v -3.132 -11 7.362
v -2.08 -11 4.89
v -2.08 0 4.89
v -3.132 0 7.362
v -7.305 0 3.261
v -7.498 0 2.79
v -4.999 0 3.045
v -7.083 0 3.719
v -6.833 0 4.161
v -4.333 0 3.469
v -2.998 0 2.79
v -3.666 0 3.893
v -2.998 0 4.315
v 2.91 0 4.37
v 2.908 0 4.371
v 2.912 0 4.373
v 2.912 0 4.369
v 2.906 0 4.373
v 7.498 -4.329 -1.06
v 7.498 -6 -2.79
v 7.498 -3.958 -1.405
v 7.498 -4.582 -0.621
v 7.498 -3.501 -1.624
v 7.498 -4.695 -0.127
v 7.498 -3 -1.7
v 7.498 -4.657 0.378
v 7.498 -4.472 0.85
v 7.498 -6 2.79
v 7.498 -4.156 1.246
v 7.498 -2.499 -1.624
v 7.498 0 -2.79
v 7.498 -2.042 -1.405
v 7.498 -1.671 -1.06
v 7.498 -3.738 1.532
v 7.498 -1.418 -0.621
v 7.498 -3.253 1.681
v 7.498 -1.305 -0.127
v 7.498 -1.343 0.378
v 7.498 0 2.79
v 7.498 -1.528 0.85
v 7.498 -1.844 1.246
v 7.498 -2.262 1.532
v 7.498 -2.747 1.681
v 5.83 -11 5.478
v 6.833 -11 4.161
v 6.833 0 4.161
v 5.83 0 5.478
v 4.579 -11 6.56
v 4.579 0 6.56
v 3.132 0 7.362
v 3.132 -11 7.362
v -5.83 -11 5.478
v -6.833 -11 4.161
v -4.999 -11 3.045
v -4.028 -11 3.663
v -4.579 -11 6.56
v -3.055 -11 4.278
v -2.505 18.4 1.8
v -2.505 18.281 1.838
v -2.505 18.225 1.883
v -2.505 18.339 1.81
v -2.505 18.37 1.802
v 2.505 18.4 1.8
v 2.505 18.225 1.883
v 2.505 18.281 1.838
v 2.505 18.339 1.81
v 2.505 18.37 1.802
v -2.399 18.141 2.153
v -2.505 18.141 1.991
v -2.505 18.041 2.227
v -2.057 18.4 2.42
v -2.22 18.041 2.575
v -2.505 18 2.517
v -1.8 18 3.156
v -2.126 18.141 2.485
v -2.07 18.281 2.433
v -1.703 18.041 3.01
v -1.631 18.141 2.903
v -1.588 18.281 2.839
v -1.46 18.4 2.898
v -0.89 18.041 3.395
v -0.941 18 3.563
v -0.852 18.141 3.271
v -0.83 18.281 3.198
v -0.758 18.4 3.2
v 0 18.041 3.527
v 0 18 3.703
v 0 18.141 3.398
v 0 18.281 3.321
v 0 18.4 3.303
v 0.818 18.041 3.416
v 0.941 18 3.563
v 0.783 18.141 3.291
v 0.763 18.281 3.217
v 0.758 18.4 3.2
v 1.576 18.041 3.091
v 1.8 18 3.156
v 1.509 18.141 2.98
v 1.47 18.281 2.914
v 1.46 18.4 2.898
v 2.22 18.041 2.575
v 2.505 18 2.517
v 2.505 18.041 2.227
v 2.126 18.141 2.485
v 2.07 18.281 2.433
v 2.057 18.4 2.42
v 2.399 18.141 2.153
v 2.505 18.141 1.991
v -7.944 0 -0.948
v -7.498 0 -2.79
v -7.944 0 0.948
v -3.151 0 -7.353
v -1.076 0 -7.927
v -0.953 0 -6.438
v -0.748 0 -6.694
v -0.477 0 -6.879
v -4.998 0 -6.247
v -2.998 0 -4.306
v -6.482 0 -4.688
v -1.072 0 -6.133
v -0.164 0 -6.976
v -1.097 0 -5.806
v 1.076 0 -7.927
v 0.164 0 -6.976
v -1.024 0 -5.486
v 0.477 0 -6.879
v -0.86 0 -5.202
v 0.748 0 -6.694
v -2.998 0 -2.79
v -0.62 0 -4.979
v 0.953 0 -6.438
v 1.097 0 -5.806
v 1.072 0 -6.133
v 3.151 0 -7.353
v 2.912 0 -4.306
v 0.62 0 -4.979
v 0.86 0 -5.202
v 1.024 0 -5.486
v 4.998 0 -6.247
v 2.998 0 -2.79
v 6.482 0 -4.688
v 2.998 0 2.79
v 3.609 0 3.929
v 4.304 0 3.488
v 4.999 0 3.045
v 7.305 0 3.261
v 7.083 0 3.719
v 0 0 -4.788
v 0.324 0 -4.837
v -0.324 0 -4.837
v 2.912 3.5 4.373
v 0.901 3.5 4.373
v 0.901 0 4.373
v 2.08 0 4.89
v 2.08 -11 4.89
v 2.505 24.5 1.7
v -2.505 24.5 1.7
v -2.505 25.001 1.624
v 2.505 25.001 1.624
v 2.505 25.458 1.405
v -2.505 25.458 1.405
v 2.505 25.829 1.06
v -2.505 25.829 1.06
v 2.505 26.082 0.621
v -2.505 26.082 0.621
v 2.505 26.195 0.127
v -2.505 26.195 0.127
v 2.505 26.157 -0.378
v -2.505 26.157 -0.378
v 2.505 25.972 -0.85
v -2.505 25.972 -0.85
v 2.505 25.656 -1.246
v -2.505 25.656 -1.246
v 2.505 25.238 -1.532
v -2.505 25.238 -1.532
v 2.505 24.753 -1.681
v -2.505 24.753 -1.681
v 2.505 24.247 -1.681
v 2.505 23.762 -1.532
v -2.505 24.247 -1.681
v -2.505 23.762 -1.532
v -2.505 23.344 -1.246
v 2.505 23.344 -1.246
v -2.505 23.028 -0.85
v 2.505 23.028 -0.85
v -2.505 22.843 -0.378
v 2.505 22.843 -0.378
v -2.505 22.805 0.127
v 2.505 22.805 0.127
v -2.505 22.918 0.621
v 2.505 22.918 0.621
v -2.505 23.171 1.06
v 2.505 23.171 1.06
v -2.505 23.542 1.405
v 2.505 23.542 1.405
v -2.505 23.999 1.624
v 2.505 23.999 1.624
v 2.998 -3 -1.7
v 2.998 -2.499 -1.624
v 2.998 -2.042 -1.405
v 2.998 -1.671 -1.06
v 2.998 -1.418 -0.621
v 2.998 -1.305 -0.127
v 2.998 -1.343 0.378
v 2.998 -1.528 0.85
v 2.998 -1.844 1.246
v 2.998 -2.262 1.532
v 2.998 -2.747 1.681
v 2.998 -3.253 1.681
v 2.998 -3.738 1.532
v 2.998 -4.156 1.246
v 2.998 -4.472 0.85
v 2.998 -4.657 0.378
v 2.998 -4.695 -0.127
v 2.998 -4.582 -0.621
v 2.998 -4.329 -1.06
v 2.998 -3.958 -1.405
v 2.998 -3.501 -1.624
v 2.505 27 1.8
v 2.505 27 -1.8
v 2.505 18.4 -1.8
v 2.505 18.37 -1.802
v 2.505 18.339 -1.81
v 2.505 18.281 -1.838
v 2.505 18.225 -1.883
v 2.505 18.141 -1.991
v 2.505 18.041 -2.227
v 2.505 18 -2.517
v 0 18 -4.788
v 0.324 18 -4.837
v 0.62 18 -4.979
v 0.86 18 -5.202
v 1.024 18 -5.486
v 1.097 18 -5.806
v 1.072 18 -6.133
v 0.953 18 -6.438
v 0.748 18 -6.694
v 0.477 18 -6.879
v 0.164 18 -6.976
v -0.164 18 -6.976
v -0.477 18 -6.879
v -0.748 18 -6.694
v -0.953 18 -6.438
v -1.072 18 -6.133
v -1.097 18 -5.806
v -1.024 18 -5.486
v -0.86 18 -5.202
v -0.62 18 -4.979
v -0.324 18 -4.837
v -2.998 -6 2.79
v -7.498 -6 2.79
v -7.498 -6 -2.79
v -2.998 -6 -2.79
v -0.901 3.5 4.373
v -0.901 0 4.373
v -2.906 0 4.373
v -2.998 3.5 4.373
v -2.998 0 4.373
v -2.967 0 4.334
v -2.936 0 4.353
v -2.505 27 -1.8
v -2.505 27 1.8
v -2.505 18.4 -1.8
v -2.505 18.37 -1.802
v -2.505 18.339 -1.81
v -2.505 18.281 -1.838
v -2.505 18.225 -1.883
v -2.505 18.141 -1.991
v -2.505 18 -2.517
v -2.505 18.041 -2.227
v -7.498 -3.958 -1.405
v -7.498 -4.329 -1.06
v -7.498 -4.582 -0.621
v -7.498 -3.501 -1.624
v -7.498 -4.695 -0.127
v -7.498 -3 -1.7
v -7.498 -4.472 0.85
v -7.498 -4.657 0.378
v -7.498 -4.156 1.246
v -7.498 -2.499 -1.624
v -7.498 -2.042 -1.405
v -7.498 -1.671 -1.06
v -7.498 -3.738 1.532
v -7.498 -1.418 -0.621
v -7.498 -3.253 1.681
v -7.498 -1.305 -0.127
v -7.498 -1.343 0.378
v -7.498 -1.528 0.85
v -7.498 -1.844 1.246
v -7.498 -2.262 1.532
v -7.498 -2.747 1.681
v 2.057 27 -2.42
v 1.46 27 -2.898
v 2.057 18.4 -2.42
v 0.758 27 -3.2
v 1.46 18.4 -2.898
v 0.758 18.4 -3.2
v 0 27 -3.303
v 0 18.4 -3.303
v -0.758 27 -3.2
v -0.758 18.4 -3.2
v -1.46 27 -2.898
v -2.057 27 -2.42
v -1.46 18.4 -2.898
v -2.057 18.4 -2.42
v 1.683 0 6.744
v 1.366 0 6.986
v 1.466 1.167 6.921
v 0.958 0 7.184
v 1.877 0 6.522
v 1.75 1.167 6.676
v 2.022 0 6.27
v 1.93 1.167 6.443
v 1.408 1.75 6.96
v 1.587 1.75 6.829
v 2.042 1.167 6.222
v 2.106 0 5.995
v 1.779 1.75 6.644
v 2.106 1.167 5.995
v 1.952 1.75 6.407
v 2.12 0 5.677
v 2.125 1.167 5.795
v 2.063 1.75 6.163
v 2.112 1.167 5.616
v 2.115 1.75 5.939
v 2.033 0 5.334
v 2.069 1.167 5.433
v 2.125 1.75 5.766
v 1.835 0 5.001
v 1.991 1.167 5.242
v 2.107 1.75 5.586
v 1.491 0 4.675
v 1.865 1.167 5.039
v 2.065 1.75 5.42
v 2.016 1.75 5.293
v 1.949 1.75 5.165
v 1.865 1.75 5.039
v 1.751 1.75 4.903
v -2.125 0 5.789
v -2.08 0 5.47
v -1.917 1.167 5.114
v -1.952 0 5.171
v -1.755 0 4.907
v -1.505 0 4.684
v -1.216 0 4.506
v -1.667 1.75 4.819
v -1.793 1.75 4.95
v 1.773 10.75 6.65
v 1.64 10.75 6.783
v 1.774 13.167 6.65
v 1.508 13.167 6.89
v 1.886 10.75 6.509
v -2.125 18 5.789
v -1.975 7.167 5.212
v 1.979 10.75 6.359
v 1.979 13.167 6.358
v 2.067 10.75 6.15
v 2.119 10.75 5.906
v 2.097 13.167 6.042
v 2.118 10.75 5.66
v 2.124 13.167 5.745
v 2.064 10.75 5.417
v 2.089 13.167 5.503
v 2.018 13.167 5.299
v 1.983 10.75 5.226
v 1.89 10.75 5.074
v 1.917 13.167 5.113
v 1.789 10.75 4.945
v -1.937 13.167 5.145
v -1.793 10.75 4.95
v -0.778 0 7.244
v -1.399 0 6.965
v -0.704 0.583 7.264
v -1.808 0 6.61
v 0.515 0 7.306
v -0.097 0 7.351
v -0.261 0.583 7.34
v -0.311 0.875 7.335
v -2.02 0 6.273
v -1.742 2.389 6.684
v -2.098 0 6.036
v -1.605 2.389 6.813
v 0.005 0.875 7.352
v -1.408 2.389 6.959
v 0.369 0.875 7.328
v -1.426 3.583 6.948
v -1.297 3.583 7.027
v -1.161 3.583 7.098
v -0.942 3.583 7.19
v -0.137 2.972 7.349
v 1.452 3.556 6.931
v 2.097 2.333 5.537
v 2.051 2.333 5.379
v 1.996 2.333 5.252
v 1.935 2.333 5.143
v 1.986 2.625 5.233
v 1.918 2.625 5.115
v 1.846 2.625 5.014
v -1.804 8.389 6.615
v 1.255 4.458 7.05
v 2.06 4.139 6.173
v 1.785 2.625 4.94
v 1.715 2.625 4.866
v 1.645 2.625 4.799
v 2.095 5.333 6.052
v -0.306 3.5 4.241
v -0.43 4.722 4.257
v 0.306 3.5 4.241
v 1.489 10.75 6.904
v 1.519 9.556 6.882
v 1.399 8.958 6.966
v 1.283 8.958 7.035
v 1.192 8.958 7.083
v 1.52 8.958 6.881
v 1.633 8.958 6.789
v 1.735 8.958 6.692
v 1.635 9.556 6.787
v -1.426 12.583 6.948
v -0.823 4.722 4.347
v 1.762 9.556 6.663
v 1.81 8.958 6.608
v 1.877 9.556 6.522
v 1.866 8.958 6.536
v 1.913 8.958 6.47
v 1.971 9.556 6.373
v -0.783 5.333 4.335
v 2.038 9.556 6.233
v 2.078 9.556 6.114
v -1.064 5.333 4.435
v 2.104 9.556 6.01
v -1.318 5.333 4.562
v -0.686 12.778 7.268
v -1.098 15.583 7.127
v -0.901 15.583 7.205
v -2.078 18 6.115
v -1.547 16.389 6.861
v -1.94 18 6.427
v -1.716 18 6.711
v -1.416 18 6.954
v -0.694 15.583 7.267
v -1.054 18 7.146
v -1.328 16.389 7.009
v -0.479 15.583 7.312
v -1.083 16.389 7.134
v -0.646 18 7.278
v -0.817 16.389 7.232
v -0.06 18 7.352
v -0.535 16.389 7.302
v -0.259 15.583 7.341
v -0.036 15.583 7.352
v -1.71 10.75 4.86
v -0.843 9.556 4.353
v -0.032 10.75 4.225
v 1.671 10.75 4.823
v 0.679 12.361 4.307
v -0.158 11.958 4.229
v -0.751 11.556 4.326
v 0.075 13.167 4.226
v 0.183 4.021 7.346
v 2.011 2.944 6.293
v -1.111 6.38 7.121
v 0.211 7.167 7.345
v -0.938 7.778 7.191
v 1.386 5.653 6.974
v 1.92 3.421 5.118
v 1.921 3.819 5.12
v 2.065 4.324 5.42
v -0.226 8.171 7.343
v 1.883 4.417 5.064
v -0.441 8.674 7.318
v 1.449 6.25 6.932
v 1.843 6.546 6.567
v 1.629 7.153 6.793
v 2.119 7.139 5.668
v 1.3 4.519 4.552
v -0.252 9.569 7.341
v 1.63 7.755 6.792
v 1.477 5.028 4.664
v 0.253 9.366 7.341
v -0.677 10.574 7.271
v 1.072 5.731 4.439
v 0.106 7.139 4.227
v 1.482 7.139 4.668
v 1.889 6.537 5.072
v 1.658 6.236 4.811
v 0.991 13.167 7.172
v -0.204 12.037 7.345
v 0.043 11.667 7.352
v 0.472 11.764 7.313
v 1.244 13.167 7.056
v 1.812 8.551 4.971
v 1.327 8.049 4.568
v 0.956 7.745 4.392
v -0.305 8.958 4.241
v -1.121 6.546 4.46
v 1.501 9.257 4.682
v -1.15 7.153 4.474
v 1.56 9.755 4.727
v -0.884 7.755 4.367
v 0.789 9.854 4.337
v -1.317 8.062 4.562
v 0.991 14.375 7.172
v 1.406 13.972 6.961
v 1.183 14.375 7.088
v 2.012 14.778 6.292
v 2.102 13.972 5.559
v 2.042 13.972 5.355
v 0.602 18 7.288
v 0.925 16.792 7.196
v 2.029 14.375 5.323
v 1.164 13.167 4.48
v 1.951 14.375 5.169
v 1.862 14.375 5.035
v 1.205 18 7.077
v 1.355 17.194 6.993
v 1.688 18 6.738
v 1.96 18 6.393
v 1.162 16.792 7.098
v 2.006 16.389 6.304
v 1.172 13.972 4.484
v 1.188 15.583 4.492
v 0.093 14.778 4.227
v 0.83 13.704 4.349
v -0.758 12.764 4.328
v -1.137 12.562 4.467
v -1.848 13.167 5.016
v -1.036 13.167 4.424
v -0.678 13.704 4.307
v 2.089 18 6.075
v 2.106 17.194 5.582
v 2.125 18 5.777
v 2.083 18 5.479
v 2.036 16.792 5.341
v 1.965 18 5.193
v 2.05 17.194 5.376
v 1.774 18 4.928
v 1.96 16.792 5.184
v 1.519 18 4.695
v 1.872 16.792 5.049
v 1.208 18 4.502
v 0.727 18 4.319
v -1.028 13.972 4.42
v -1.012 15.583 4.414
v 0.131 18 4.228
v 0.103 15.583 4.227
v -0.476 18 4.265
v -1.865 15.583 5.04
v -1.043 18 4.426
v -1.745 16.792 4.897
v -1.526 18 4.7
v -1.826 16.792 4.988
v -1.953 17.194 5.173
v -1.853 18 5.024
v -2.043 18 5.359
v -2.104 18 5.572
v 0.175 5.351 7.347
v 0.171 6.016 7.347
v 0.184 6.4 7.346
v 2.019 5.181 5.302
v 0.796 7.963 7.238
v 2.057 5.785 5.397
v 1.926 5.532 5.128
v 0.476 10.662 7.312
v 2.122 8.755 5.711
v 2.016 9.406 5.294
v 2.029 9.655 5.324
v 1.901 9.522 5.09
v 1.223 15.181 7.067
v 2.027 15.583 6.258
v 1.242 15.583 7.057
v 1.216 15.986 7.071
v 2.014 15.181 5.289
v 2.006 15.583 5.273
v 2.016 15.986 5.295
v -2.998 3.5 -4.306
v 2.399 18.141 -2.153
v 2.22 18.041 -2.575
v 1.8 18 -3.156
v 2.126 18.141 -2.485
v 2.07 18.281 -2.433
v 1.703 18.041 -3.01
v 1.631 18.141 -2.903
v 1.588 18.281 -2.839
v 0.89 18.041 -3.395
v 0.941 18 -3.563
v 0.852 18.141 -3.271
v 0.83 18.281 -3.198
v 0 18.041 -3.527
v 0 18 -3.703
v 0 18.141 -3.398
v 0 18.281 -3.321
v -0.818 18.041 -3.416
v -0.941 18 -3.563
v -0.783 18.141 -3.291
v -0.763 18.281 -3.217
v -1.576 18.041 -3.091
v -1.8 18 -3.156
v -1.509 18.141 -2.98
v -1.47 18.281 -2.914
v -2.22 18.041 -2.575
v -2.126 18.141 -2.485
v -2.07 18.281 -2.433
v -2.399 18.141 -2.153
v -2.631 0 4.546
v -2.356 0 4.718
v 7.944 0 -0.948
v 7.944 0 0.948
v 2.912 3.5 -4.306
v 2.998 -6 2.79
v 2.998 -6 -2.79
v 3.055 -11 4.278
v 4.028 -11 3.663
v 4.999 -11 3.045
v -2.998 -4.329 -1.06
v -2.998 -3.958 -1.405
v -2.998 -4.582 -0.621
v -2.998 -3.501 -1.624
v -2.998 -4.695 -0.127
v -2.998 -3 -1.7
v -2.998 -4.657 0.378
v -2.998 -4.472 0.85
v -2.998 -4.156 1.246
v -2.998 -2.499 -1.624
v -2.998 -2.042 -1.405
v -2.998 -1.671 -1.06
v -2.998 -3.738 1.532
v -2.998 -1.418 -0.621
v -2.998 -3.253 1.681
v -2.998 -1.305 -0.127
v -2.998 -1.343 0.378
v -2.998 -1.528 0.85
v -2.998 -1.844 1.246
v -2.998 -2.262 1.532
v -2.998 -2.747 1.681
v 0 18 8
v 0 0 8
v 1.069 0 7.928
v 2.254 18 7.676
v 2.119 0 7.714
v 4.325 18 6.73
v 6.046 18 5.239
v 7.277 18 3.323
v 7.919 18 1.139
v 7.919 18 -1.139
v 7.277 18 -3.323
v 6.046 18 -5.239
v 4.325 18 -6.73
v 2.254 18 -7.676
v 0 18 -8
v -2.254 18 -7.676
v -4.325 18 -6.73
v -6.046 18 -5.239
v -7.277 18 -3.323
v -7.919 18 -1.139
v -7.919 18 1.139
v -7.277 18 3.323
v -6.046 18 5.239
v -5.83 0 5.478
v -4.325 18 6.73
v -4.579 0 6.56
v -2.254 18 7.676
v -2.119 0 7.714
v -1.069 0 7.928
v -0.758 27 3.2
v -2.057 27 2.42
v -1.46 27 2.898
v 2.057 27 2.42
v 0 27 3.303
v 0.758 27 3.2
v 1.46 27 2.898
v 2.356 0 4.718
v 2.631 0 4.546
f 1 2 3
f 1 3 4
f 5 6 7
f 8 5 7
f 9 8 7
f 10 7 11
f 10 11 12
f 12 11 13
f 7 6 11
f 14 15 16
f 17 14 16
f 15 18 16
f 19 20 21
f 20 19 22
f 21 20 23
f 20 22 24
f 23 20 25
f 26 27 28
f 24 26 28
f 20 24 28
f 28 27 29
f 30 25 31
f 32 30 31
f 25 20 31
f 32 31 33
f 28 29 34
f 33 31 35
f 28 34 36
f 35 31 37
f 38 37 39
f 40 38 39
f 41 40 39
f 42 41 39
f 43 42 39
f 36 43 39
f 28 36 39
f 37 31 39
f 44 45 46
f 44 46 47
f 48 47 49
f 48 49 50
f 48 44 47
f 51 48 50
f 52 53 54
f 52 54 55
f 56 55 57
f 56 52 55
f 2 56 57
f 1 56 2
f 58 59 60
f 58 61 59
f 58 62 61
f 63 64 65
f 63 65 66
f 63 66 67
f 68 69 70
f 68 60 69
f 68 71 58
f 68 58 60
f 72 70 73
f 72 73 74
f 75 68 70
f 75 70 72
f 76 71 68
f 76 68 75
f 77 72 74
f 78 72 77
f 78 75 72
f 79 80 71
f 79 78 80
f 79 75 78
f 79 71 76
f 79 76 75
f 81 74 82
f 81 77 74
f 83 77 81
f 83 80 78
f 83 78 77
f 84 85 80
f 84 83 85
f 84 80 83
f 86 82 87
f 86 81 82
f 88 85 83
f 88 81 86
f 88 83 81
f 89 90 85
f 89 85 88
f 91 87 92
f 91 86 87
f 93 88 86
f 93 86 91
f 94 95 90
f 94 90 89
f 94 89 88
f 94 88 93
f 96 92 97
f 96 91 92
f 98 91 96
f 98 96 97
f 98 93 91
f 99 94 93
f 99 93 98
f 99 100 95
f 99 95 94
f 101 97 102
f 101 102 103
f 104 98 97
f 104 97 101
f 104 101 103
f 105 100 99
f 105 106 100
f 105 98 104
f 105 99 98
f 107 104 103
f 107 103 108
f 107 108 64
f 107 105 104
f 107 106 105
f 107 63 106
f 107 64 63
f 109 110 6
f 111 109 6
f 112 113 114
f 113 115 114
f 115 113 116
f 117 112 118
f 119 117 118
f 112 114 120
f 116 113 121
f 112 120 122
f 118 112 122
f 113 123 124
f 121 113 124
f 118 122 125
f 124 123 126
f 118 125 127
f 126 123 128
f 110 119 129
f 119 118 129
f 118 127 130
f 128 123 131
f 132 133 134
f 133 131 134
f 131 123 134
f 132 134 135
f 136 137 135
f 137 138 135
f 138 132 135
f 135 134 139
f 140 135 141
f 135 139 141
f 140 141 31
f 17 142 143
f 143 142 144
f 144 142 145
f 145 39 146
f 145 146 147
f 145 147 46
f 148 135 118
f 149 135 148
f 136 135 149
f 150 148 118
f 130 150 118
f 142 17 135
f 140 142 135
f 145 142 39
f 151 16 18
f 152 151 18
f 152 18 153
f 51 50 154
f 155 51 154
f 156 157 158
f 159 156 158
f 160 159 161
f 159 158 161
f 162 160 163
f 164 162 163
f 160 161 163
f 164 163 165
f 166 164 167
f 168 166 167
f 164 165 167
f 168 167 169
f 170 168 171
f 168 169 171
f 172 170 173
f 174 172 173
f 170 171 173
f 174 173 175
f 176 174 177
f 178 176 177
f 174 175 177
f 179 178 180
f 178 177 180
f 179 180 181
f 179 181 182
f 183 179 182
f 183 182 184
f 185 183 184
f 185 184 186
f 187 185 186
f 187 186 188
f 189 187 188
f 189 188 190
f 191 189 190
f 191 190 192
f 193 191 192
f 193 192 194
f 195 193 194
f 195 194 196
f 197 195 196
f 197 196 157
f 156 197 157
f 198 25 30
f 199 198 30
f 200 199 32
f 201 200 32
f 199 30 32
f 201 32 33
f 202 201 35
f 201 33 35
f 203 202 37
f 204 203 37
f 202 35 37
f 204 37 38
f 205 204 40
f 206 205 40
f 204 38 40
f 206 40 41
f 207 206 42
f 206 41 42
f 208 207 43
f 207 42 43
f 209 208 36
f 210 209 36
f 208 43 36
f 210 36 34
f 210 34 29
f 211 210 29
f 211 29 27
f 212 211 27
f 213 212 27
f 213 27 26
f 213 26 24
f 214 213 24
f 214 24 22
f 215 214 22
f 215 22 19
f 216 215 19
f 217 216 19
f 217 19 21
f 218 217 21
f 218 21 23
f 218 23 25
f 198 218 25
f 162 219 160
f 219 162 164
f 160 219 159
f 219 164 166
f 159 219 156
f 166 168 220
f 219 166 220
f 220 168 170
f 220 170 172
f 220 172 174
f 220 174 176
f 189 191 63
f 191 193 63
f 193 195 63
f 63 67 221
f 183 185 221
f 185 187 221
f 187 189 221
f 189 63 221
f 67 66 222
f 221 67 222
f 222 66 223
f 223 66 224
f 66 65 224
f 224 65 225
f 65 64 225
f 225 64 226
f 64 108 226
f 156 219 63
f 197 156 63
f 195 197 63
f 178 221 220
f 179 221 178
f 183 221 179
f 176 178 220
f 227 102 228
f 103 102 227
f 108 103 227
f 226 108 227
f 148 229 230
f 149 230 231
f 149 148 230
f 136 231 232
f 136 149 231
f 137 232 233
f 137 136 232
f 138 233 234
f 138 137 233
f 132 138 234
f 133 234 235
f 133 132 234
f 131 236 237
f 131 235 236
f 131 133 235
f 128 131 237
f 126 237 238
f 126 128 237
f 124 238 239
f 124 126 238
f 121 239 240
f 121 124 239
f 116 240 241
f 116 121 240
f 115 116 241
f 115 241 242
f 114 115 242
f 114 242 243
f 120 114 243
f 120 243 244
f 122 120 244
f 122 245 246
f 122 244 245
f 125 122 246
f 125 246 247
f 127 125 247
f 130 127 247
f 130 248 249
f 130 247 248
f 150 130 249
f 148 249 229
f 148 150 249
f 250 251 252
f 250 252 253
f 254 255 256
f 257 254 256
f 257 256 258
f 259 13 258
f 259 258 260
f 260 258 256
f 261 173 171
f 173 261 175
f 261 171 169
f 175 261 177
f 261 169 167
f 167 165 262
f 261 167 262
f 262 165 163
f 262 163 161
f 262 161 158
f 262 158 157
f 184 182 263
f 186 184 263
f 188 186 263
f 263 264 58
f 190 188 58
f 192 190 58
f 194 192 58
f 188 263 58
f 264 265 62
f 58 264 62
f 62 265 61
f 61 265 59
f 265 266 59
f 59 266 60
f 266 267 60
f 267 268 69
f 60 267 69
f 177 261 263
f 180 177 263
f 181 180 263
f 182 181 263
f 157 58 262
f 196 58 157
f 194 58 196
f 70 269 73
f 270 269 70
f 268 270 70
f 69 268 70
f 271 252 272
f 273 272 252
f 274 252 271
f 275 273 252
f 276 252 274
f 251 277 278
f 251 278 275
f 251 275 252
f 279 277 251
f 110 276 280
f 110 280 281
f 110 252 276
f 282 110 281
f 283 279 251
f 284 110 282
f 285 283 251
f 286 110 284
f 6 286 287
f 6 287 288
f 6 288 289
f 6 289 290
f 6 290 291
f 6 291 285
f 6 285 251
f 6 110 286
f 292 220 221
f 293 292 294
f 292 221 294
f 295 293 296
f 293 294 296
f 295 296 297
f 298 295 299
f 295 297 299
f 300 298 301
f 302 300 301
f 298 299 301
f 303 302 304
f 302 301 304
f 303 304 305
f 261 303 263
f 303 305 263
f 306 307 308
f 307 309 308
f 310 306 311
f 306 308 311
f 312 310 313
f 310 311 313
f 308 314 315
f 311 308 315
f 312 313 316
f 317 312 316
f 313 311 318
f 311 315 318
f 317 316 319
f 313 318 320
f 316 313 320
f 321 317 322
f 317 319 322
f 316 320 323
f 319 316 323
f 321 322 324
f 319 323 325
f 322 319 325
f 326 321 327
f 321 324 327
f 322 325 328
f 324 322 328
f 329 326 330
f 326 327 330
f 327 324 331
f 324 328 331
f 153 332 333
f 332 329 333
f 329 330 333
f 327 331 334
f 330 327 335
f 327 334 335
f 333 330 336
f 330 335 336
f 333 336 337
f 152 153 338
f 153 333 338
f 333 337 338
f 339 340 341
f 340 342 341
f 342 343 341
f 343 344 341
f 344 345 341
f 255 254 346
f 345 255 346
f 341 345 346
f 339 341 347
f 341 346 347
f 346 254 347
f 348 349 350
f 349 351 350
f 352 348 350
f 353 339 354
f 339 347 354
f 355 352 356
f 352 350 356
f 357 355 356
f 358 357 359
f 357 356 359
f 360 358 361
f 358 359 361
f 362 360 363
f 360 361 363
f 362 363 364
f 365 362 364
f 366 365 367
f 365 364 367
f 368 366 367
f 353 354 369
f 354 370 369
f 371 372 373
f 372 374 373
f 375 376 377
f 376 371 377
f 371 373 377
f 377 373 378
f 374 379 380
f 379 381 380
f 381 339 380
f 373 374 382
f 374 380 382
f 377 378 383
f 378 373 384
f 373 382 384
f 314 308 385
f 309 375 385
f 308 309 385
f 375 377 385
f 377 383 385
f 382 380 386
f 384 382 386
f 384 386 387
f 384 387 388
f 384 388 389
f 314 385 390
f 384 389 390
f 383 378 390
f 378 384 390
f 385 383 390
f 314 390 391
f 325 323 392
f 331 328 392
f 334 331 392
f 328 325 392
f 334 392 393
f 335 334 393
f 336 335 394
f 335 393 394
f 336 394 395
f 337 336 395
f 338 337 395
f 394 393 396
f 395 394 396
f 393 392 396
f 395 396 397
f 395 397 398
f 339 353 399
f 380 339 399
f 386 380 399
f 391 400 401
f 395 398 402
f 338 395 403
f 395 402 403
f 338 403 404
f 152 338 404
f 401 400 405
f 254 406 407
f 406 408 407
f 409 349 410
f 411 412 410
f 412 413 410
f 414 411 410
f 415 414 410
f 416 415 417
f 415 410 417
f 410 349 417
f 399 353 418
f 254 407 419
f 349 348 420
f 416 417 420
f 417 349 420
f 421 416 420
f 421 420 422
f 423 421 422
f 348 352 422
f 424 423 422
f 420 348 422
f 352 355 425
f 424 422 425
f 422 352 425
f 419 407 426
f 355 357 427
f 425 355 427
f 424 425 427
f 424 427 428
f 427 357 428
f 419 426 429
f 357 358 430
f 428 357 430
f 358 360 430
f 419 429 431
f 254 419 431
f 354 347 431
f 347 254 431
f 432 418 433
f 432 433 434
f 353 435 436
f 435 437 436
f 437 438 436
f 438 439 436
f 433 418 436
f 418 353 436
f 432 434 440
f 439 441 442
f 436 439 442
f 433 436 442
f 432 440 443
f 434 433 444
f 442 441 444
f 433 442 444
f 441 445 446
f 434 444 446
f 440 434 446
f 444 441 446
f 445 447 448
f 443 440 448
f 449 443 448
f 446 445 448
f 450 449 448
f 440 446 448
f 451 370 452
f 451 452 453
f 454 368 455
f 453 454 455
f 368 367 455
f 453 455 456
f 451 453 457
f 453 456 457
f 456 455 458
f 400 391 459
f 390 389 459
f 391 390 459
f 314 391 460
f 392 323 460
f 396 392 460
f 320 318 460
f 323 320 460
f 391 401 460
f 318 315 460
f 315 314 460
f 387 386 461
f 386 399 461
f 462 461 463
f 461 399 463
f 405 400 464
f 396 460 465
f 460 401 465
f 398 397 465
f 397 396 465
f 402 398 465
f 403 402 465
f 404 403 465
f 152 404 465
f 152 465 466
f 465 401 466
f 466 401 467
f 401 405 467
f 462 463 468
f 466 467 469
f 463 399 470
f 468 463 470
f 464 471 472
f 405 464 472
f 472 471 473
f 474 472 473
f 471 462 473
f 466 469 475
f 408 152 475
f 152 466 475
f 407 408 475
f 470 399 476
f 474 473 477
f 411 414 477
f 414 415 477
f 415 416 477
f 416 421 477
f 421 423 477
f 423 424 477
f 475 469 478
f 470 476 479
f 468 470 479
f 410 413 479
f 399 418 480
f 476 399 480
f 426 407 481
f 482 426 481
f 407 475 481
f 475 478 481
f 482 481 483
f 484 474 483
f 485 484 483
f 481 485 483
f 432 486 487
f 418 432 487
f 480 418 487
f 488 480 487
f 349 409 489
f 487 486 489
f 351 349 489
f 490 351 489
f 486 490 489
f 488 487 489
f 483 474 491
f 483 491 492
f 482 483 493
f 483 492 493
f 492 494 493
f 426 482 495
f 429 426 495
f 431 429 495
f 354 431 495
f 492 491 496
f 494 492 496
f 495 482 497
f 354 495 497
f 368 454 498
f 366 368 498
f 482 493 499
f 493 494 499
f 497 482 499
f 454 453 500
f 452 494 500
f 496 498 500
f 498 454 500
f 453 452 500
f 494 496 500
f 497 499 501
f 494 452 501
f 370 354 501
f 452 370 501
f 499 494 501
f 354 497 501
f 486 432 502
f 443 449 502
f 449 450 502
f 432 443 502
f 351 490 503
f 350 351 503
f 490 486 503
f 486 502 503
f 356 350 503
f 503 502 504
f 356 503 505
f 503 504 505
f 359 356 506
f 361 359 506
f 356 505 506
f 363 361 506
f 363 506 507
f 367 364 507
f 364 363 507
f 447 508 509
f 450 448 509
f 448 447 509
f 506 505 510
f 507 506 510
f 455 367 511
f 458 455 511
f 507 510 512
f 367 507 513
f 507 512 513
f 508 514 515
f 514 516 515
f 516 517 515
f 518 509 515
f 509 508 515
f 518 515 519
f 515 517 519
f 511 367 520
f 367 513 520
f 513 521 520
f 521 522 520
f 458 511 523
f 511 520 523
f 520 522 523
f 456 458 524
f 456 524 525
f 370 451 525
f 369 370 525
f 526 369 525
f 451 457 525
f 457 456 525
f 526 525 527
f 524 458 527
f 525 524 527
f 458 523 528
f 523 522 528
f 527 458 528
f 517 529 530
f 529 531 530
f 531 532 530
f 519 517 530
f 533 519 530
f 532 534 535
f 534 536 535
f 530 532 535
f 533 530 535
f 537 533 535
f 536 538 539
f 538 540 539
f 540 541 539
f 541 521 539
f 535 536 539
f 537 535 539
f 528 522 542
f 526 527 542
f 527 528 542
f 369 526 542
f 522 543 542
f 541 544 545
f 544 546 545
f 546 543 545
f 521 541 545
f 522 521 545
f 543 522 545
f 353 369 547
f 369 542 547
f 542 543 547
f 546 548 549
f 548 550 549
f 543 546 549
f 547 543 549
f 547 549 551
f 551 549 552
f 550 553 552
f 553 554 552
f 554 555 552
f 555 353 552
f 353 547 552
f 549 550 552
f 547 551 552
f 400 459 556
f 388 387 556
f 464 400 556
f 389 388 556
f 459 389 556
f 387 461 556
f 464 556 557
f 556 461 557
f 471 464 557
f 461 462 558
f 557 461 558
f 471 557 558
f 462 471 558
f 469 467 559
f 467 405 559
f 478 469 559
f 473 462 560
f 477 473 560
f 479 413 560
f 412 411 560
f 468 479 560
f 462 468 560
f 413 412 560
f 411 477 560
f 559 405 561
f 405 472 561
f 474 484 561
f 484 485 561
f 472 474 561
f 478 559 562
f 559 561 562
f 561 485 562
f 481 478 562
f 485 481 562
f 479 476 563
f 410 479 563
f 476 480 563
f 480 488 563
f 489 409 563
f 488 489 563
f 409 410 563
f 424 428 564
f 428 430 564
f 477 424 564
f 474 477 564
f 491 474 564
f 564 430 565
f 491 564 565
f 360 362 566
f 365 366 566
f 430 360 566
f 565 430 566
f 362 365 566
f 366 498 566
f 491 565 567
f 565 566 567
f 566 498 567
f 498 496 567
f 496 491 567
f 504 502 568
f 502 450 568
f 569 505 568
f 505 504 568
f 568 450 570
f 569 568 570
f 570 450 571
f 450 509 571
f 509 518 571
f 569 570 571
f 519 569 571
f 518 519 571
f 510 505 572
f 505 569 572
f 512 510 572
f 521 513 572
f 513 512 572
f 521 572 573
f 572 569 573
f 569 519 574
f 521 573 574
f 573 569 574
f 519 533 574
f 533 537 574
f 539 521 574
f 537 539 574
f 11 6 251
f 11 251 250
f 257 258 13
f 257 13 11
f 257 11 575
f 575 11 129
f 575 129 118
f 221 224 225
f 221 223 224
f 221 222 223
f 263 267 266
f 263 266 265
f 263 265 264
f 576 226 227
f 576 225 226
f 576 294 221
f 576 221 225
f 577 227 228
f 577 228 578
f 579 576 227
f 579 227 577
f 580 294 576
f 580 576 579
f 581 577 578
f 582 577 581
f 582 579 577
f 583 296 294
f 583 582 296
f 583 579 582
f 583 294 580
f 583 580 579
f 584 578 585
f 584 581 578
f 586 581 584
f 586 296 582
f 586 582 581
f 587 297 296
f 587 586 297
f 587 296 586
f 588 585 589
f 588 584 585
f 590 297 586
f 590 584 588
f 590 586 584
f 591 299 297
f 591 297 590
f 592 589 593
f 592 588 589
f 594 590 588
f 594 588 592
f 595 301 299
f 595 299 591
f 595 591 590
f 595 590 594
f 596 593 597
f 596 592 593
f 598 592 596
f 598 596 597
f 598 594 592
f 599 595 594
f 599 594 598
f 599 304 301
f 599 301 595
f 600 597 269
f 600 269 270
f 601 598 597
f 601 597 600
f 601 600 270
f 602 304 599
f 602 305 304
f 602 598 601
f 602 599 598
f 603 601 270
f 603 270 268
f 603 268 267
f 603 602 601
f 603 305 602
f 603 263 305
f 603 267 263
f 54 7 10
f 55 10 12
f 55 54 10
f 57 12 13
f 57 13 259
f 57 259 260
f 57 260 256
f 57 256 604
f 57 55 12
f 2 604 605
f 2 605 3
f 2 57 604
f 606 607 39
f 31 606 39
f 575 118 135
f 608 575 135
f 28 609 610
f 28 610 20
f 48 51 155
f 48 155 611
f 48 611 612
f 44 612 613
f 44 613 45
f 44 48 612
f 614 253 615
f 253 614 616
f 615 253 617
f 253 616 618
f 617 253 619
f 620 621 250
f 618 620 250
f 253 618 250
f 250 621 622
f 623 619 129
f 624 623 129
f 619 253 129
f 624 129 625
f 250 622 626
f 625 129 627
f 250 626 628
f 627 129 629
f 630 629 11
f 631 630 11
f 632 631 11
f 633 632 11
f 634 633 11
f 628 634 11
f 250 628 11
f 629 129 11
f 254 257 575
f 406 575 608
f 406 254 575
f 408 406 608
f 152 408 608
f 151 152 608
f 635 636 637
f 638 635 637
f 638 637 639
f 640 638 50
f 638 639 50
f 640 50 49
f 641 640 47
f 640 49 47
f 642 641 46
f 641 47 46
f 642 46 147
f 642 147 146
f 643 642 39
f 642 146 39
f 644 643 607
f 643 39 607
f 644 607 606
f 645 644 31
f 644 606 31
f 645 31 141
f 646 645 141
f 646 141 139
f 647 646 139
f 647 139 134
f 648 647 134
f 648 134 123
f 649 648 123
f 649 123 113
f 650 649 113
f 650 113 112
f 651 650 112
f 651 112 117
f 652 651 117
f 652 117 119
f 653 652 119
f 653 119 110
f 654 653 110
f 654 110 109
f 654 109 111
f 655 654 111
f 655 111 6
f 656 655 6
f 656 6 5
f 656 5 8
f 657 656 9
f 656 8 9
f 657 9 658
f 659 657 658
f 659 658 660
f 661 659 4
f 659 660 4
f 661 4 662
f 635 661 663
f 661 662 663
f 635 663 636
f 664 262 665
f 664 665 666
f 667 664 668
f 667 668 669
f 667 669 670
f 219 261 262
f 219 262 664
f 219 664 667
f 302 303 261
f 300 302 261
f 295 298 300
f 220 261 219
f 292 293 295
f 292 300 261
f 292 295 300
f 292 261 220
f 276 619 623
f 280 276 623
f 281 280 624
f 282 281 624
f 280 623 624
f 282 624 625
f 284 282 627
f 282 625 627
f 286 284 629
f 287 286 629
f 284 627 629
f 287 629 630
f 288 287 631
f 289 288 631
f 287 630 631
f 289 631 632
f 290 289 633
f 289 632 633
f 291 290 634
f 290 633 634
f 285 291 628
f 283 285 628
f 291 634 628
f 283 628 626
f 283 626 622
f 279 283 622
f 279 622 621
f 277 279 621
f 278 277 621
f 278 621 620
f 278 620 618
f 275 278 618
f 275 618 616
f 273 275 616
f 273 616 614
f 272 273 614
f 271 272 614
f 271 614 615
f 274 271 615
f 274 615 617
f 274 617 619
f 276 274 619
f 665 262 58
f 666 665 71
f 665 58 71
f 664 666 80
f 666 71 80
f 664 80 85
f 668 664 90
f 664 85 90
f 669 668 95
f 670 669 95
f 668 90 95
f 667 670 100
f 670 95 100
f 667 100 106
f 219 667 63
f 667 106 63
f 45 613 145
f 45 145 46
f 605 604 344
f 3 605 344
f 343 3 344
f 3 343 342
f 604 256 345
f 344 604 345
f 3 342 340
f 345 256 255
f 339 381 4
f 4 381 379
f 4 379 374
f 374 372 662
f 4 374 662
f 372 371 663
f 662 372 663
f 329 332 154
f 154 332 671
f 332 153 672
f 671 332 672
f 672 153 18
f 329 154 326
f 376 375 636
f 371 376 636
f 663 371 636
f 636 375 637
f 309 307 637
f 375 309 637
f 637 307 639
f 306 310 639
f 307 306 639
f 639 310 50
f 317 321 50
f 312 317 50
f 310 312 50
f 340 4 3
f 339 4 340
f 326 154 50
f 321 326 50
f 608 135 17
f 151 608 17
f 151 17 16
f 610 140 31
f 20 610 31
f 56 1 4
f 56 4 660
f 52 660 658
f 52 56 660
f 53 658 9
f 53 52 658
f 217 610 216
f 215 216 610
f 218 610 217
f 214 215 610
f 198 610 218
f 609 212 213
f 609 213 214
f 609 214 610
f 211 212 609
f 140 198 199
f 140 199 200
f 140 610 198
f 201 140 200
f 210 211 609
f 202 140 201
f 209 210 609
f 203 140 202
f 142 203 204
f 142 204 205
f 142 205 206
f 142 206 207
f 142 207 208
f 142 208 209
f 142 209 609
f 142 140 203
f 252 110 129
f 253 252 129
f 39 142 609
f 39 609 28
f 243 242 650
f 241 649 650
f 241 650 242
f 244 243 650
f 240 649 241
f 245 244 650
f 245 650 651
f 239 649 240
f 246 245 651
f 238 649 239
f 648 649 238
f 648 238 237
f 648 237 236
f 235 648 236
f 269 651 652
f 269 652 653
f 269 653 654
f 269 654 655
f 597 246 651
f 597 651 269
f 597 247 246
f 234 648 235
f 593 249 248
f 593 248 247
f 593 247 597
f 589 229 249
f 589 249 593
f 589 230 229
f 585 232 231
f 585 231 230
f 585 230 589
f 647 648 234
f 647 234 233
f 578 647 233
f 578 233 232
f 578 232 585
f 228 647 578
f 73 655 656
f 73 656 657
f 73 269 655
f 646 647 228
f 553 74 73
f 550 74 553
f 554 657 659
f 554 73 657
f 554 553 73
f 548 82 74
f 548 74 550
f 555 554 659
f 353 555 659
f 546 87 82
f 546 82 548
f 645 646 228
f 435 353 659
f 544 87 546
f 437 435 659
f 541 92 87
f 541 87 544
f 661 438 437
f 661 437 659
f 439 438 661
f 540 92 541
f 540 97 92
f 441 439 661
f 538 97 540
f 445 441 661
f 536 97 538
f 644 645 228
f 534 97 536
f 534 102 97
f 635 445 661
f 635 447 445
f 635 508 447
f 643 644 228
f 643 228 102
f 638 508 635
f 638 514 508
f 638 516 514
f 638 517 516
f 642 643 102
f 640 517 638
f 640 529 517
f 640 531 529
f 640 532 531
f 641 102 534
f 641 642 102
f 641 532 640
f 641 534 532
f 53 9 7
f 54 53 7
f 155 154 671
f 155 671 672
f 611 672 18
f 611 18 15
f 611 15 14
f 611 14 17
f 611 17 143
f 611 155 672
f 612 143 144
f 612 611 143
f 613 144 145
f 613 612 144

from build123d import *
from build123d.topology import SkipClean

# Parameters (mm, degrees)
SKETCH2_R           = 8
BOSS_EXTRUDE1_DEPTH = 18
BOSS_EXTRUDE3_DEPTH = 9
FILLET1_R           = 0.4
SKETCH12_R          = 1.1
CUT_EXTRUDE2_DEPTH  = 30.274562429
SKETCH13_R          = 1.7
CUT_EXTRUDE3_DEPTH  = 31.055691415
SKETCH14_W          = 4.5
SKETCH14_H          = 5.58
BOSS_EXTRUDE5_DEPTH = 6
SKETCH15_R          = 1.7
CUT_EXTRUDE4_DEPTH  = 33.143110095
SKETCH18_RX         = 2.125
SKETCH18_RY         = 1.56360128
CUT_EXTRUDE5_DEPTH  = 27.532998323
BOSS_EXTRUDE6_START = 11
BOSS_EXTRUDE6_DEPTH = 11
CUT_EXTRUDE6_DEPTH  = 3.5


with BuildPart() as part:
    # Sketch2 → Boss-Extrude1 (new body)
    with BuildSketch(Plane(origin=(0, 0, 0), x_dir=(1, 0, 0), z_dir=(0, 1, 0))):
        with Locations(Location((0, 0, 0), (0, 0, 270))):
            Circle(SKETCH2_R)
    extrude(amount=BOSS_EXTRUDE1_DEPTH)

    # Sketch4 → Boss-Extrude3 (add)
    with BuildSketch(Plane(origin=(0, 18, 0), x_dir=(1, 0, 0), z_dir=(0, 1, 0))):
        with BuildLine():
            Line((2.504502892, -1.8), (2.504502892, 1.8))
            ThreePointArc((2.504502892, 1.8), (0, 3.30267653), (-2.504502892, 1.8))
            Line((-2.504502892, 1.8), (-2.504502892, -1.8))
            ThreePointArc((-2.504502892, -1.8), (0, -3.30267653), (2.504502892, -1.8))
        make_face()
    extrude(amount=BOSS_EXTRUDE3_DEPTH)

    # Fillet1
    fillet1_edges = [part.edges().sort_by_distance(p)[0] for p in [
        (0, 18, -3.30267653),
        (0, 18, 3.30267653),
    ]]
    fillet(fillet1_edges, radius=FILLET1_R)

    # Sketch12 → Cut-Extrude2 (cut, through all)
    with BuildSketch(Plane(origin=(0, 0, 0), x_dir=(1, 0, 0), z_dir=(0, 1, 0))):
        with Locations(Location((0, 5.887857779, 0), (0, 0, 270))):
            Circle(SKETCH12_R)
    extrude(amount=CUT_EXTRUDE2_DEPTH, mode=Mode.SUBTRACT)

    # Sketch13 → Cut-Extrude3 (cut, through all)
    with BuildSketch(Plane.ZY.offset(2.504502892)):
        with Locations((0, 24.5)):
            Circle(SKETCH13_R)
    extrude(amount=-CUT_EXTRUDE3_DEPTH, mode=Mode.SUBTRACT)

    # Sketch14 → Boss-Extrude5 (add)
    with BuildSketch(Plane.XZ):
        with Locations((-5.247726322, 0)):
            Rectangle(SKETCH14_W, SKETCH14_H)
        with Locations((5.247726322, 0)):
            Rectangle(SKETCH14_W, SKETCH14_H)
    extrude(amount=BOSS_EXTRUDE5_DEPTH)

    # Sketch15 → Cut-Extrude4 (cut, through all)
    with BuildSketch(Plane(origin=(7.497726322, 0, 0), x_dir=(0, 0, -1), z_dir=(1, 0, 0))):
        with Locations((0, -3)):
            Circle(SKETCH15_R)
    extrude(amount=-CUT_EXTRUDE4_DEPTH, mode=Mode.SUBTRACT)

    # Sketch18 → Cut-Extrude5 (cut, through all)
    with BuildSketch(Plane(origin=(0, 18, 0), x_dir=(1, 0, 0), z_dir=(0, 1, 0))):
        with Locations(Location((0, -5.788604863), (0, 0, 180))):
            Ellipse(SKETCH18_RX, SKETCH18_RY)
    extrude(amount=-CUT_EXTRUDE5_DEPTH, mode=Mode.SUBTRACT)

    # Sketch19 → Boss-Extrude6 (add)
    with SkipClean():  # the faces are left unmerged after this step: merging them gives an invalid solid
        with BuildSketch(Plane.XZ.offset(BOSS_EXTRUDE6_START)):
            with BuildLine():
                Line((-6.832550312, 4.1612806), (-4.998986356, 3.04457106))
                ThreePointArc((-4.998986356, 3.04457106), (-3.54196191, 3.971164487), (-2.080323071, 4.890461784))
                Line((-2.080323071, 4.890461784), (-3.131517904, 7.361629956))
                ThreePointArc((-3.131517904, 7.361629956), (-5.232707029, 6.051345069), (-6.832550312, 4.1612806))
            make_face()
            with BuildLine():
                Line((3.131517904, 7.361629956), (2.080323071, 4.890461784))
                ThreePointArc((2.080323071, 4.890461784), (3.54196191, 3.971164487), (4.998986356, 3.04457106))
                Line((4.998986356, 3.04457106), (6.832550312, 4.1612806))
                ThreePointArc((6.832550312, 4.1612806), (5.232707029, 6.051345069), (3.131517904, 7.361629956))
            make_face()
        extrude(amount=-BOSS_EXTRUDE6_DEPTH)

    # Sketch20 → Cut-Extrude6 (cut)
    with SkipClean():  # the faces are left unmerged after this step: merging them gives an invalid solid
        with BuildSketch(Plane.XZ):
            Polygon((2.911854561, -2.79), (2.911854561, 2.79), (2.911854561, 4.372678458), (-2.997726322, 4.372678458), (-2.997726322, 2.79), (-2.997726322, -2.79), (-2.997726322, -4.306263787), (2.911854561, -4.306263787), align=None)
        extrude(amount=-CUT_EXTRUDE6_DEPTH, mode=Mode.SUBTRACT)


solid = part.part
